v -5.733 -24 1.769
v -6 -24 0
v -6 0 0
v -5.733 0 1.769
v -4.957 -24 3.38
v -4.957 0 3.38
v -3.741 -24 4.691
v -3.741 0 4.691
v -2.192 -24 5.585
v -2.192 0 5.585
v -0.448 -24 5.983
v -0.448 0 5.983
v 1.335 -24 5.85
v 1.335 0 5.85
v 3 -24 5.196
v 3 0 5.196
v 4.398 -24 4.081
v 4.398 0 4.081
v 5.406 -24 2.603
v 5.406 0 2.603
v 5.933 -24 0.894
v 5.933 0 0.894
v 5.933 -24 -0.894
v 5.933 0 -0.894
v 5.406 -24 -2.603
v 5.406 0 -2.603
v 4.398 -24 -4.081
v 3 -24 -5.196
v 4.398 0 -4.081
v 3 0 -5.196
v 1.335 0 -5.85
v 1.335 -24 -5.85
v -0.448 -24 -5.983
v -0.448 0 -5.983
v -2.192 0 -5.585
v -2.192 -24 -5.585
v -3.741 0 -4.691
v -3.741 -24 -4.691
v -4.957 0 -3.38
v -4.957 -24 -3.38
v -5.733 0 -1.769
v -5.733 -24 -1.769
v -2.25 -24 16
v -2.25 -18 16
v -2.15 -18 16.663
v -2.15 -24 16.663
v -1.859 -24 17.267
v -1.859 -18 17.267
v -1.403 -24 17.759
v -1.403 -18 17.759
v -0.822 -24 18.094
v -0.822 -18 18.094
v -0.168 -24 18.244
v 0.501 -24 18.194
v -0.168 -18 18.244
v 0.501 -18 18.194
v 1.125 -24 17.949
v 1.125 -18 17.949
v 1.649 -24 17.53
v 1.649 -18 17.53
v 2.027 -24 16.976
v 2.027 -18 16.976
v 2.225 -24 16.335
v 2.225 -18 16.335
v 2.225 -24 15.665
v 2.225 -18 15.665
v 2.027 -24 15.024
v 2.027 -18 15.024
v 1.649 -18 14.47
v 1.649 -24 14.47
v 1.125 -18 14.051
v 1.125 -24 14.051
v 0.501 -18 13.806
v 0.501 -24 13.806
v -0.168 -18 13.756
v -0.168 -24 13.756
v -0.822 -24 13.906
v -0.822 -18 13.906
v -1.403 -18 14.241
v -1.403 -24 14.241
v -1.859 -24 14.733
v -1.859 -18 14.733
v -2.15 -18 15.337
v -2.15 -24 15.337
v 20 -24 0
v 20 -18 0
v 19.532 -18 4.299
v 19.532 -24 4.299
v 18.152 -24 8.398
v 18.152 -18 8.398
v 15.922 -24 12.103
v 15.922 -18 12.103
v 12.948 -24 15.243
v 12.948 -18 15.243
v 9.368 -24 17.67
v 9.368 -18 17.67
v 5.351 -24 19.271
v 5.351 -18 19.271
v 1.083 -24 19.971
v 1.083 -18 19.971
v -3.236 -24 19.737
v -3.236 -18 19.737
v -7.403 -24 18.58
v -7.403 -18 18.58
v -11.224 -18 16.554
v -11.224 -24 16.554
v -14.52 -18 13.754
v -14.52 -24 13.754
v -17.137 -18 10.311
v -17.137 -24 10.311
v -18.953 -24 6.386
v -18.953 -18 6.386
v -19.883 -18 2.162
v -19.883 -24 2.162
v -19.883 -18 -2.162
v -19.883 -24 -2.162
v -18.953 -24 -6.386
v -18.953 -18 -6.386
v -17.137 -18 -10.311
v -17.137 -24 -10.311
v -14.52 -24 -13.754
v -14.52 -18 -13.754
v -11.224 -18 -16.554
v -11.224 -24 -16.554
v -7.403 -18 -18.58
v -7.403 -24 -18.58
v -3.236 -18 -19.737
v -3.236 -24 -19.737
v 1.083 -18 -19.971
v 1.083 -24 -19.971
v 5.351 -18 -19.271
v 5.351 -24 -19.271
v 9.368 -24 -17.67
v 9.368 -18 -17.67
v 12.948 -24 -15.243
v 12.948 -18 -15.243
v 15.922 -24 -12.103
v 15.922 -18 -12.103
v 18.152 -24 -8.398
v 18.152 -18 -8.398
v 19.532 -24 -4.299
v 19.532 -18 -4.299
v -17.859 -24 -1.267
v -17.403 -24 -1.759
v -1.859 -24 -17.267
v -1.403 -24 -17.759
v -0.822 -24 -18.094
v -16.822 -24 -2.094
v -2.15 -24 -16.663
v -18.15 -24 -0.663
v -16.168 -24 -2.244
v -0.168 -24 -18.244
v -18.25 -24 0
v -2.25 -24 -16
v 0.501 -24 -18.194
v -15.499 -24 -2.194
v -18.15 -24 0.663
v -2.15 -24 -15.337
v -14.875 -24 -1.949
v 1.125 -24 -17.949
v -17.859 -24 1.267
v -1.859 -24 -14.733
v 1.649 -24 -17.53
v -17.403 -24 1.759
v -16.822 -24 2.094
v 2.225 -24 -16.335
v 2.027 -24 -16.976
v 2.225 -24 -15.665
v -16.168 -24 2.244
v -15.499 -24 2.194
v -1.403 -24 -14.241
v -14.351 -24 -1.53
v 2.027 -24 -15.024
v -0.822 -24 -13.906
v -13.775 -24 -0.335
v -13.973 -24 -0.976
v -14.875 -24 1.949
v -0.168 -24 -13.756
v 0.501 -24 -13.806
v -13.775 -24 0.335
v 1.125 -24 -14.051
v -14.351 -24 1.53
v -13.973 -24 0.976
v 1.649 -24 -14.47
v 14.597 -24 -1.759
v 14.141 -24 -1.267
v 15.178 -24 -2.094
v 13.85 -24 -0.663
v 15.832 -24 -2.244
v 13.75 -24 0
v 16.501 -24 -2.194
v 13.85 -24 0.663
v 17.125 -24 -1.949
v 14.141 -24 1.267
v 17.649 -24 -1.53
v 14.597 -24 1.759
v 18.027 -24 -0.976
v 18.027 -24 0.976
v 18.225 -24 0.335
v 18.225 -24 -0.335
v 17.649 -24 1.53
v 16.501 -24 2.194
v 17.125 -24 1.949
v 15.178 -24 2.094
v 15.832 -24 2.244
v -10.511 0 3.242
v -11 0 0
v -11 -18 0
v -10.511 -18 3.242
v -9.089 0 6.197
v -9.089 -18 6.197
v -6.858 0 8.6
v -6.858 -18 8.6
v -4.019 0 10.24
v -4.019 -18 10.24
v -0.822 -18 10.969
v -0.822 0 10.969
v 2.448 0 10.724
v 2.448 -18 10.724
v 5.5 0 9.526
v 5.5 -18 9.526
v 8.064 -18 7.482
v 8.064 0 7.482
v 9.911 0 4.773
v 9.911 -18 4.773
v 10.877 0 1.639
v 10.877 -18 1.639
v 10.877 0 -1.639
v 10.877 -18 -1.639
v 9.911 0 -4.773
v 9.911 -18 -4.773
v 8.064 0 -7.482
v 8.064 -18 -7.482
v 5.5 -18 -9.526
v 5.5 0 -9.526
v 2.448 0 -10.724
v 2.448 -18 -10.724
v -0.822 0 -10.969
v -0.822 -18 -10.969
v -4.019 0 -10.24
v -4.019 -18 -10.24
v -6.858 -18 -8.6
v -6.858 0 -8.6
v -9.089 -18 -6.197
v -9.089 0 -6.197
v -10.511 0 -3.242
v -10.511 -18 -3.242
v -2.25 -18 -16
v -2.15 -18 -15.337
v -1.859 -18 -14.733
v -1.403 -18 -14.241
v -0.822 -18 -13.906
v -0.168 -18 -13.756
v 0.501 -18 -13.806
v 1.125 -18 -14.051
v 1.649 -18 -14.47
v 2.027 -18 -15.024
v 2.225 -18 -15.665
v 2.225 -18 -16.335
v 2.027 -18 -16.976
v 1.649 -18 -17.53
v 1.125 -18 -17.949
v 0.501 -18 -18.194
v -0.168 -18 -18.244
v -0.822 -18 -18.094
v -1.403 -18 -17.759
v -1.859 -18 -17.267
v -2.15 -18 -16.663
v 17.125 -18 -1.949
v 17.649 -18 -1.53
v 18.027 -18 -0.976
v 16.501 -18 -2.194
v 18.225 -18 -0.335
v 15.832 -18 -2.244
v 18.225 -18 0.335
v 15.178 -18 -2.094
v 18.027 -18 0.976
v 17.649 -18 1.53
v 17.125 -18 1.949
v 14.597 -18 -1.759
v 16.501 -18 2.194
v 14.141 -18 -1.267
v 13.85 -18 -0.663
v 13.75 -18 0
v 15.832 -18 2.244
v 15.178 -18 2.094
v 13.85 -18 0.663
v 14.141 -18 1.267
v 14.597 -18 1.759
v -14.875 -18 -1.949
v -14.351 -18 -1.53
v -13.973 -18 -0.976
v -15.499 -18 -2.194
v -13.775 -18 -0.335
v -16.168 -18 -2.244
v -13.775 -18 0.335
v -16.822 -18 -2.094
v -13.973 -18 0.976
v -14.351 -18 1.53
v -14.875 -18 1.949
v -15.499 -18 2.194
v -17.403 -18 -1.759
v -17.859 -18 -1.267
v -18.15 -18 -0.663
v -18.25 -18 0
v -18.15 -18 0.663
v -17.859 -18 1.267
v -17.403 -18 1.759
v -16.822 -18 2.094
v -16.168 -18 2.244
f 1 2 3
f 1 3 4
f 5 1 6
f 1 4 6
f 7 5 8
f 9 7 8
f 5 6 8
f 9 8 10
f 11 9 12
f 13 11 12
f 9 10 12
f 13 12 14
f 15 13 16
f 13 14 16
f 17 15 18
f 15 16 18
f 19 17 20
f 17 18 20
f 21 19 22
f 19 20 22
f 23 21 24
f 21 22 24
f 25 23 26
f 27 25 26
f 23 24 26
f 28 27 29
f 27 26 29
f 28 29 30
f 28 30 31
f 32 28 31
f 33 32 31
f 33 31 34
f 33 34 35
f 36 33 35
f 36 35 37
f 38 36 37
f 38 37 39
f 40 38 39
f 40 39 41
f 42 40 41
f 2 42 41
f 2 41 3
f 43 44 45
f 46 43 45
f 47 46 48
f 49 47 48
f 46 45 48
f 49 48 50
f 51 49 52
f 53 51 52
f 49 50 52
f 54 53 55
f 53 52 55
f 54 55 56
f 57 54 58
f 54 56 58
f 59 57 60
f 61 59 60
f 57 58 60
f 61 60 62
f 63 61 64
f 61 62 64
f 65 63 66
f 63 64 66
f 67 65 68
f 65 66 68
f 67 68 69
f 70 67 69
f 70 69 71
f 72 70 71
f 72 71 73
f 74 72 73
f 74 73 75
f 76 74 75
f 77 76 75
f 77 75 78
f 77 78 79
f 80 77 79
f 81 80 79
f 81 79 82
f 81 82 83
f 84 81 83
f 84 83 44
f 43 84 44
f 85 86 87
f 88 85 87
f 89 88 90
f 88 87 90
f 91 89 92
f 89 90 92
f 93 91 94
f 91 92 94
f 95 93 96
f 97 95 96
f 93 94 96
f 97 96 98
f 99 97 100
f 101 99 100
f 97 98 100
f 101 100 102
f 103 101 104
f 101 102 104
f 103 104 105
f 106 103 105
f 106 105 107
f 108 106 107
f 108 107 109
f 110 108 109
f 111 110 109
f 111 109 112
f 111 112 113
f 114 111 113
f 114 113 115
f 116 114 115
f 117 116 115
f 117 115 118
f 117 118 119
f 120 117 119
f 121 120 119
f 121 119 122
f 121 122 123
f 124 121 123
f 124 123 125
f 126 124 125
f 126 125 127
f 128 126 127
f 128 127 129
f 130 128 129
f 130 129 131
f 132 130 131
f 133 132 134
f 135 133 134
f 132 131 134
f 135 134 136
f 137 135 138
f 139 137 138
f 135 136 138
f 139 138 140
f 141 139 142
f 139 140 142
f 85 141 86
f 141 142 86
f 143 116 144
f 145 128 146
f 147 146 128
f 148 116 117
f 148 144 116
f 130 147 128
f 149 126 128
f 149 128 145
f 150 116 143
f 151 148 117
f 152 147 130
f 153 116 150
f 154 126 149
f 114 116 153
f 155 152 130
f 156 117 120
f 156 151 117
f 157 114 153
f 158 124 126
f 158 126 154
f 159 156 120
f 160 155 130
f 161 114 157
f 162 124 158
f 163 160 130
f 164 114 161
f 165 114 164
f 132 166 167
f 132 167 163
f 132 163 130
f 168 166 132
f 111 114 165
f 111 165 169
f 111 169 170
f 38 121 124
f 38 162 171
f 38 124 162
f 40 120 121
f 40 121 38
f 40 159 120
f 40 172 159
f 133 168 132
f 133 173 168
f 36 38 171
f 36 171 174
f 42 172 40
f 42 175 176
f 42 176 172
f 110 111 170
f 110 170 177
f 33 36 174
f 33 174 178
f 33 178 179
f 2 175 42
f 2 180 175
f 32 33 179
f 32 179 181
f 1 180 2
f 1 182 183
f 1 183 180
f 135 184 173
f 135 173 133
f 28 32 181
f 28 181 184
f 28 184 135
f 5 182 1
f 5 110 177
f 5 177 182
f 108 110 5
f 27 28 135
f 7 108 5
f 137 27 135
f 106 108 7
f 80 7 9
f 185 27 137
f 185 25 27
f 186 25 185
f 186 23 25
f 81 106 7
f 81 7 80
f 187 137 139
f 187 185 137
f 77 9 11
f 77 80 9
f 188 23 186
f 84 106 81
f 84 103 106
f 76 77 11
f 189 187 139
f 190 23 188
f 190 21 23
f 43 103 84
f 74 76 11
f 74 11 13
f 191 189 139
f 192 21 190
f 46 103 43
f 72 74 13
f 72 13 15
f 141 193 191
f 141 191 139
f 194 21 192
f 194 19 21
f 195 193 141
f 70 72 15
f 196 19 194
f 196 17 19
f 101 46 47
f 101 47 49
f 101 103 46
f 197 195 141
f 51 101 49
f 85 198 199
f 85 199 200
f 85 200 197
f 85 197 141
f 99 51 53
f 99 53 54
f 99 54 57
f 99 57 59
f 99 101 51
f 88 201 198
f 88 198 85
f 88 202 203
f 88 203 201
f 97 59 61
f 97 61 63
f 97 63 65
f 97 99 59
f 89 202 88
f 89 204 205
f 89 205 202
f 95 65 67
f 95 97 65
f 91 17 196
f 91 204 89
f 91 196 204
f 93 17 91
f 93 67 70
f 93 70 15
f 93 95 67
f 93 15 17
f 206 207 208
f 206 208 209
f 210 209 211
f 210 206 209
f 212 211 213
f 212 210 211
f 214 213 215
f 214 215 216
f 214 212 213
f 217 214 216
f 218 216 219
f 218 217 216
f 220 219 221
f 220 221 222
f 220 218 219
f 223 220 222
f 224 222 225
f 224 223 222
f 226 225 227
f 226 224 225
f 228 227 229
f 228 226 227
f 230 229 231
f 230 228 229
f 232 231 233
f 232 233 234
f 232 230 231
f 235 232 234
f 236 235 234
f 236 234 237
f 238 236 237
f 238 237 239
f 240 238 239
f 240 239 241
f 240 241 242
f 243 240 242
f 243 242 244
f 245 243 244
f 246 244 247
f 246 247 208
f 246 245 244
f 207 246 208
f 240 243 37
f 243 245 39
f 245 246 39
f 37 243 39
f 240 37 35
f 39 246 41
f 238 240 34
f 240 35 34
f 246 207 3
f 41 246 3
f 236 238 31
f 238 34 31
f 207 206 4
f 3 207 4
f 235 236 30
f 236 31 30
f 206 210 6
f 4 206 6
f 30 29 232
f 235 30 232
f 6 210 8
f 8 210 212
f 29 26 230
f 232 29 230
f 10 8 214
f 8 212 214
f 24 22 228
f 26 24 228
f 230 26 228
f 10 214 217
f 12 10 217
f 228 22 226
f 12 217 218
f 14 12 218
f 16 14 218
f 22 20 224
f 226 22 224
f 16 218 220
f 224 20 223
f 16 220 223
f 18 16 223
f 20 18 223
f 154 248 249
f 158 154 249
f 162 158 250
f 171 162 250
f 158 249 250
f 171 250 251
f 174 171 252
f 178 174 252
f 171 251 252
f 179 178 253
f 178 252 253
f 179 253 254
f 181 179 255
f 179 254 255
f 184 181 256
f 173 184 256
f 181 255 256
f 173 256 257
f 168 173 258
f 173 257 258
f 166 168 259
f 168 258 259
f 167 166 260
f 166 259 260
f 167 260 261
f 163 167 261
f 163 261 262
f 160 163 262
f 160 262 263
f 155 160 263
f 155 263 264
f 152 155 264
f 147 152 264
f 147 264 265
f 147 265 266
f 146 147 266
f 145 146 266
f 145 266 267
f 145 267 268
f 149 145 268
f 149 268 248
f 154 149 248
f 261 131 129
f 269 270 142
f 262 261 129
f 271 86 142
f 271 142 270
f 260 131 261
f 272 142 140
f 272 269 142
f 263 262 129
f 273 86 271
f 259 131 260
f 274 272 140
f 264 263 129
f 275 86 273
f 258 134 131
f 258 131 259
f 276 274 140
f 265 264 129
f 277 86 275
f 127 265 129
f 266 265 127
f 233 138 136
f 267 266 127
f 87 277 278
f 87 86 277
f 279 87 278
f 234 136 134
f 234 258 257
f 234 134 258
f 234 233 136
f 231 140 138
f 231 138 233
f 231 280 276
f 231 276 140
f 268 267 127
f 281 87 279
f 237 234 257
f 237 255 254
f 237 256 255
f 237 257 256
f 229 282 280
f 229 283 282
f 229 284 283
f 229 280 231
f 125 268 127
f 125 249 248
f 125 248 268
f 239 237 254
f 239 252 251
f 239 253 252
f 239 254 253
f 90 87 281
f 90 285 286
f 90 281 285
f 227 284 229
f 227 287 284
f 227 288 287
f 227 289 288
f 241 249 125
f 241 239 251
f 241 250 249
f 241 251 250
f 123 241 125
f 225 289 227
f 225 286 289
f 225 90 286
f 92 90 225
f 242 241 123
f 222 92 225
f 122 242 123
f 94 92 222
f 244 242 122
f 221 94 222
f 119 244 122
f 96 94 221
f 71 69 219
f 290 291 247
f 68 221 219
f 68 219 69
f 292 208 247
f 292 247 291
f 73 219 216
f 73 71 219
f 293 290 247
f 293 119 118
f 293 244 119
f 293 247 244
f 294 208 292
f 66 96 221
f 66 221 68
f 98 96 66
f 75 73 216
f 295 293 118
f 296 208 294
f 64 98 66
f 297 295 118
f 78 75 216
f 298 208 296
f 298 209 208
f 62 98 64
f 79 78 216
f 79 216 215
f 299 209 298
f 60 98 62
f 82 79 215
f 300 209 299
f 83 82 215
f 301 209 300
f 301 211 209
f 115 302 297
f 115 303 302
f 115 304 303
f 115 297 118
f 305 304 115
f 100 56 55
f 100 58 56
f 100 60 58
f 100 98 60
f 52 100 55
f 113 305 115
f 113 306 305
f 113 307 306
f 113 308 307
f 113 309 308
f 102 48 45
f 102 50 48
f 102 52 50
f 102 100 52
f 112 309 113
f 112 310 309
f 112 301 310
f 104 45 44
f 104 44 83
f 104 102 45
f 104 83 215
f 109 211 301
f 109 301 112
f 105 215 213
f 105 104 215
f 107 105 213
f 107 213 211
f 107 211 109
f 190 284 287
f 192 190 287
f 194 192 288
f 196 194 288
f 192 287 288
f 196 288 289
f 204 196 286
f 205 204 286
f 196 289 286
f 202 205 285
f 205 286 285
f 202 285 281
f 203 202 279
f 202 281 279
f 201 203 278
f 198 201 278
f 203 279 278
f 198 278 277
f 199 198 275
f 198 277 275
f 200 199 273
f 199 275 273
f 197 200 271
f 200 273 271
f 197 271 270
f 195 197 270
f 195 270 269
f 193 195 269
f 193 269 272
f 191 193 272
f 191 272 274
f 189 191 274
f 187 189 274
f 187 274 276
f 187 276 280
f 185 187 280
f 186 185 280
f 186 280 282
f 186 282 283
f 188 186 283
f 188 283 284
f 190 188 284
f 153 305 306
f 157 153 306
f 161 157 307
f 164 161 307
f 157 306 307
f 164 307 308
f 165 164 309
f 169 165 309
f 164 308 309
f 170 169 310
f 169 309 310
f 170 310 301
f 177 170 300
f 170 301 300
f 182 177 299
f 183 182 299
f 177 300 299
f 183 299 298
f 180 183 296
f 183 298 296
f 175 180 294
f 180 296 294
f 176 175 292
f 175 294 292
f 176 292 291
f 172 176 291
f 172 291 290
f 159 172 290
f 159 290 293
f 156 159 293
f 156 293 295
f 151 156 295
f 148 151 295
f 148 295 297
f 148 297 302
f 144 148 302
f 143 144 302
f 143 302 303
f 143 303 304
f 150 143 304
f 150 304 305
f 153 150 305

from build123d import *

# Parameters (mm, degrees)
F0_R     = 20
F0_R_2   = 11
F0_R_3   = 6
F1_DEPTH = 24
F2_R     = 6
F3_DEPTH = 24.001
F4_R     = 20
F4_R_2   = 11
F5_DEPTH = 18
F6_R     = 2.25
F7_DEPTH = 6.001


with BuildPart() as f1:
    # F0 (on Front) → F1 (new body)
    with BuildSketch(Plane.XZ):
        Circle(F0_R)
        Circle(F0_R_2, mode=Mode.SUBTRACT)
        Circle(F0_R_2)
        Circle(F0_R_3, mode=Mode.SUBTRACT)
        Circle(F0_R_3)
    extrude(amount=F1_DEPTH)

    # F2 (on face) → F3 (cut, through all)
    with BuildSketch(Plane(origin=(0, 0, 0), x_dir=(-1, 0, 0), z_dir=(0, 1, 0))):
        Circle(F2_R)
    extrude(amount=-F3_DEPTH, mode=Mode.SUBTRACT)

    # F4 (on face) → F5 (cut)
    with BuildSketch(Plane(origin=(0, 0, 0), x_dir=(-1, 0, 0), z_dir=(0, 1, 0))):
        Circle(F4_R)
        Circle(F4_R_2, mode=Mode.SUBTRACT)
    extrude(amount=-F5_DEPTH, mode=Mode.SUBTRACT)

    # F6 (on face) → F7 (cut, through all)
    with BuildSketch(Plane(origin=(0, -18, 0), x_dir=(-1, 0, 0), z_dir=(0, 1, 0))):
        with Locations((-16, 0)):
            Circle(F6_R)
        with Locations((0, -16)):
            Circle(F6_R)
        with Locations((16, 0)):
            Circle(F6_R)
        with Locations((0, 16)):
            Circle(F6_R)
    extrude(amount=-F7_DEPTH, mode=Mode.SUBTRACT)


solid = f1.part
